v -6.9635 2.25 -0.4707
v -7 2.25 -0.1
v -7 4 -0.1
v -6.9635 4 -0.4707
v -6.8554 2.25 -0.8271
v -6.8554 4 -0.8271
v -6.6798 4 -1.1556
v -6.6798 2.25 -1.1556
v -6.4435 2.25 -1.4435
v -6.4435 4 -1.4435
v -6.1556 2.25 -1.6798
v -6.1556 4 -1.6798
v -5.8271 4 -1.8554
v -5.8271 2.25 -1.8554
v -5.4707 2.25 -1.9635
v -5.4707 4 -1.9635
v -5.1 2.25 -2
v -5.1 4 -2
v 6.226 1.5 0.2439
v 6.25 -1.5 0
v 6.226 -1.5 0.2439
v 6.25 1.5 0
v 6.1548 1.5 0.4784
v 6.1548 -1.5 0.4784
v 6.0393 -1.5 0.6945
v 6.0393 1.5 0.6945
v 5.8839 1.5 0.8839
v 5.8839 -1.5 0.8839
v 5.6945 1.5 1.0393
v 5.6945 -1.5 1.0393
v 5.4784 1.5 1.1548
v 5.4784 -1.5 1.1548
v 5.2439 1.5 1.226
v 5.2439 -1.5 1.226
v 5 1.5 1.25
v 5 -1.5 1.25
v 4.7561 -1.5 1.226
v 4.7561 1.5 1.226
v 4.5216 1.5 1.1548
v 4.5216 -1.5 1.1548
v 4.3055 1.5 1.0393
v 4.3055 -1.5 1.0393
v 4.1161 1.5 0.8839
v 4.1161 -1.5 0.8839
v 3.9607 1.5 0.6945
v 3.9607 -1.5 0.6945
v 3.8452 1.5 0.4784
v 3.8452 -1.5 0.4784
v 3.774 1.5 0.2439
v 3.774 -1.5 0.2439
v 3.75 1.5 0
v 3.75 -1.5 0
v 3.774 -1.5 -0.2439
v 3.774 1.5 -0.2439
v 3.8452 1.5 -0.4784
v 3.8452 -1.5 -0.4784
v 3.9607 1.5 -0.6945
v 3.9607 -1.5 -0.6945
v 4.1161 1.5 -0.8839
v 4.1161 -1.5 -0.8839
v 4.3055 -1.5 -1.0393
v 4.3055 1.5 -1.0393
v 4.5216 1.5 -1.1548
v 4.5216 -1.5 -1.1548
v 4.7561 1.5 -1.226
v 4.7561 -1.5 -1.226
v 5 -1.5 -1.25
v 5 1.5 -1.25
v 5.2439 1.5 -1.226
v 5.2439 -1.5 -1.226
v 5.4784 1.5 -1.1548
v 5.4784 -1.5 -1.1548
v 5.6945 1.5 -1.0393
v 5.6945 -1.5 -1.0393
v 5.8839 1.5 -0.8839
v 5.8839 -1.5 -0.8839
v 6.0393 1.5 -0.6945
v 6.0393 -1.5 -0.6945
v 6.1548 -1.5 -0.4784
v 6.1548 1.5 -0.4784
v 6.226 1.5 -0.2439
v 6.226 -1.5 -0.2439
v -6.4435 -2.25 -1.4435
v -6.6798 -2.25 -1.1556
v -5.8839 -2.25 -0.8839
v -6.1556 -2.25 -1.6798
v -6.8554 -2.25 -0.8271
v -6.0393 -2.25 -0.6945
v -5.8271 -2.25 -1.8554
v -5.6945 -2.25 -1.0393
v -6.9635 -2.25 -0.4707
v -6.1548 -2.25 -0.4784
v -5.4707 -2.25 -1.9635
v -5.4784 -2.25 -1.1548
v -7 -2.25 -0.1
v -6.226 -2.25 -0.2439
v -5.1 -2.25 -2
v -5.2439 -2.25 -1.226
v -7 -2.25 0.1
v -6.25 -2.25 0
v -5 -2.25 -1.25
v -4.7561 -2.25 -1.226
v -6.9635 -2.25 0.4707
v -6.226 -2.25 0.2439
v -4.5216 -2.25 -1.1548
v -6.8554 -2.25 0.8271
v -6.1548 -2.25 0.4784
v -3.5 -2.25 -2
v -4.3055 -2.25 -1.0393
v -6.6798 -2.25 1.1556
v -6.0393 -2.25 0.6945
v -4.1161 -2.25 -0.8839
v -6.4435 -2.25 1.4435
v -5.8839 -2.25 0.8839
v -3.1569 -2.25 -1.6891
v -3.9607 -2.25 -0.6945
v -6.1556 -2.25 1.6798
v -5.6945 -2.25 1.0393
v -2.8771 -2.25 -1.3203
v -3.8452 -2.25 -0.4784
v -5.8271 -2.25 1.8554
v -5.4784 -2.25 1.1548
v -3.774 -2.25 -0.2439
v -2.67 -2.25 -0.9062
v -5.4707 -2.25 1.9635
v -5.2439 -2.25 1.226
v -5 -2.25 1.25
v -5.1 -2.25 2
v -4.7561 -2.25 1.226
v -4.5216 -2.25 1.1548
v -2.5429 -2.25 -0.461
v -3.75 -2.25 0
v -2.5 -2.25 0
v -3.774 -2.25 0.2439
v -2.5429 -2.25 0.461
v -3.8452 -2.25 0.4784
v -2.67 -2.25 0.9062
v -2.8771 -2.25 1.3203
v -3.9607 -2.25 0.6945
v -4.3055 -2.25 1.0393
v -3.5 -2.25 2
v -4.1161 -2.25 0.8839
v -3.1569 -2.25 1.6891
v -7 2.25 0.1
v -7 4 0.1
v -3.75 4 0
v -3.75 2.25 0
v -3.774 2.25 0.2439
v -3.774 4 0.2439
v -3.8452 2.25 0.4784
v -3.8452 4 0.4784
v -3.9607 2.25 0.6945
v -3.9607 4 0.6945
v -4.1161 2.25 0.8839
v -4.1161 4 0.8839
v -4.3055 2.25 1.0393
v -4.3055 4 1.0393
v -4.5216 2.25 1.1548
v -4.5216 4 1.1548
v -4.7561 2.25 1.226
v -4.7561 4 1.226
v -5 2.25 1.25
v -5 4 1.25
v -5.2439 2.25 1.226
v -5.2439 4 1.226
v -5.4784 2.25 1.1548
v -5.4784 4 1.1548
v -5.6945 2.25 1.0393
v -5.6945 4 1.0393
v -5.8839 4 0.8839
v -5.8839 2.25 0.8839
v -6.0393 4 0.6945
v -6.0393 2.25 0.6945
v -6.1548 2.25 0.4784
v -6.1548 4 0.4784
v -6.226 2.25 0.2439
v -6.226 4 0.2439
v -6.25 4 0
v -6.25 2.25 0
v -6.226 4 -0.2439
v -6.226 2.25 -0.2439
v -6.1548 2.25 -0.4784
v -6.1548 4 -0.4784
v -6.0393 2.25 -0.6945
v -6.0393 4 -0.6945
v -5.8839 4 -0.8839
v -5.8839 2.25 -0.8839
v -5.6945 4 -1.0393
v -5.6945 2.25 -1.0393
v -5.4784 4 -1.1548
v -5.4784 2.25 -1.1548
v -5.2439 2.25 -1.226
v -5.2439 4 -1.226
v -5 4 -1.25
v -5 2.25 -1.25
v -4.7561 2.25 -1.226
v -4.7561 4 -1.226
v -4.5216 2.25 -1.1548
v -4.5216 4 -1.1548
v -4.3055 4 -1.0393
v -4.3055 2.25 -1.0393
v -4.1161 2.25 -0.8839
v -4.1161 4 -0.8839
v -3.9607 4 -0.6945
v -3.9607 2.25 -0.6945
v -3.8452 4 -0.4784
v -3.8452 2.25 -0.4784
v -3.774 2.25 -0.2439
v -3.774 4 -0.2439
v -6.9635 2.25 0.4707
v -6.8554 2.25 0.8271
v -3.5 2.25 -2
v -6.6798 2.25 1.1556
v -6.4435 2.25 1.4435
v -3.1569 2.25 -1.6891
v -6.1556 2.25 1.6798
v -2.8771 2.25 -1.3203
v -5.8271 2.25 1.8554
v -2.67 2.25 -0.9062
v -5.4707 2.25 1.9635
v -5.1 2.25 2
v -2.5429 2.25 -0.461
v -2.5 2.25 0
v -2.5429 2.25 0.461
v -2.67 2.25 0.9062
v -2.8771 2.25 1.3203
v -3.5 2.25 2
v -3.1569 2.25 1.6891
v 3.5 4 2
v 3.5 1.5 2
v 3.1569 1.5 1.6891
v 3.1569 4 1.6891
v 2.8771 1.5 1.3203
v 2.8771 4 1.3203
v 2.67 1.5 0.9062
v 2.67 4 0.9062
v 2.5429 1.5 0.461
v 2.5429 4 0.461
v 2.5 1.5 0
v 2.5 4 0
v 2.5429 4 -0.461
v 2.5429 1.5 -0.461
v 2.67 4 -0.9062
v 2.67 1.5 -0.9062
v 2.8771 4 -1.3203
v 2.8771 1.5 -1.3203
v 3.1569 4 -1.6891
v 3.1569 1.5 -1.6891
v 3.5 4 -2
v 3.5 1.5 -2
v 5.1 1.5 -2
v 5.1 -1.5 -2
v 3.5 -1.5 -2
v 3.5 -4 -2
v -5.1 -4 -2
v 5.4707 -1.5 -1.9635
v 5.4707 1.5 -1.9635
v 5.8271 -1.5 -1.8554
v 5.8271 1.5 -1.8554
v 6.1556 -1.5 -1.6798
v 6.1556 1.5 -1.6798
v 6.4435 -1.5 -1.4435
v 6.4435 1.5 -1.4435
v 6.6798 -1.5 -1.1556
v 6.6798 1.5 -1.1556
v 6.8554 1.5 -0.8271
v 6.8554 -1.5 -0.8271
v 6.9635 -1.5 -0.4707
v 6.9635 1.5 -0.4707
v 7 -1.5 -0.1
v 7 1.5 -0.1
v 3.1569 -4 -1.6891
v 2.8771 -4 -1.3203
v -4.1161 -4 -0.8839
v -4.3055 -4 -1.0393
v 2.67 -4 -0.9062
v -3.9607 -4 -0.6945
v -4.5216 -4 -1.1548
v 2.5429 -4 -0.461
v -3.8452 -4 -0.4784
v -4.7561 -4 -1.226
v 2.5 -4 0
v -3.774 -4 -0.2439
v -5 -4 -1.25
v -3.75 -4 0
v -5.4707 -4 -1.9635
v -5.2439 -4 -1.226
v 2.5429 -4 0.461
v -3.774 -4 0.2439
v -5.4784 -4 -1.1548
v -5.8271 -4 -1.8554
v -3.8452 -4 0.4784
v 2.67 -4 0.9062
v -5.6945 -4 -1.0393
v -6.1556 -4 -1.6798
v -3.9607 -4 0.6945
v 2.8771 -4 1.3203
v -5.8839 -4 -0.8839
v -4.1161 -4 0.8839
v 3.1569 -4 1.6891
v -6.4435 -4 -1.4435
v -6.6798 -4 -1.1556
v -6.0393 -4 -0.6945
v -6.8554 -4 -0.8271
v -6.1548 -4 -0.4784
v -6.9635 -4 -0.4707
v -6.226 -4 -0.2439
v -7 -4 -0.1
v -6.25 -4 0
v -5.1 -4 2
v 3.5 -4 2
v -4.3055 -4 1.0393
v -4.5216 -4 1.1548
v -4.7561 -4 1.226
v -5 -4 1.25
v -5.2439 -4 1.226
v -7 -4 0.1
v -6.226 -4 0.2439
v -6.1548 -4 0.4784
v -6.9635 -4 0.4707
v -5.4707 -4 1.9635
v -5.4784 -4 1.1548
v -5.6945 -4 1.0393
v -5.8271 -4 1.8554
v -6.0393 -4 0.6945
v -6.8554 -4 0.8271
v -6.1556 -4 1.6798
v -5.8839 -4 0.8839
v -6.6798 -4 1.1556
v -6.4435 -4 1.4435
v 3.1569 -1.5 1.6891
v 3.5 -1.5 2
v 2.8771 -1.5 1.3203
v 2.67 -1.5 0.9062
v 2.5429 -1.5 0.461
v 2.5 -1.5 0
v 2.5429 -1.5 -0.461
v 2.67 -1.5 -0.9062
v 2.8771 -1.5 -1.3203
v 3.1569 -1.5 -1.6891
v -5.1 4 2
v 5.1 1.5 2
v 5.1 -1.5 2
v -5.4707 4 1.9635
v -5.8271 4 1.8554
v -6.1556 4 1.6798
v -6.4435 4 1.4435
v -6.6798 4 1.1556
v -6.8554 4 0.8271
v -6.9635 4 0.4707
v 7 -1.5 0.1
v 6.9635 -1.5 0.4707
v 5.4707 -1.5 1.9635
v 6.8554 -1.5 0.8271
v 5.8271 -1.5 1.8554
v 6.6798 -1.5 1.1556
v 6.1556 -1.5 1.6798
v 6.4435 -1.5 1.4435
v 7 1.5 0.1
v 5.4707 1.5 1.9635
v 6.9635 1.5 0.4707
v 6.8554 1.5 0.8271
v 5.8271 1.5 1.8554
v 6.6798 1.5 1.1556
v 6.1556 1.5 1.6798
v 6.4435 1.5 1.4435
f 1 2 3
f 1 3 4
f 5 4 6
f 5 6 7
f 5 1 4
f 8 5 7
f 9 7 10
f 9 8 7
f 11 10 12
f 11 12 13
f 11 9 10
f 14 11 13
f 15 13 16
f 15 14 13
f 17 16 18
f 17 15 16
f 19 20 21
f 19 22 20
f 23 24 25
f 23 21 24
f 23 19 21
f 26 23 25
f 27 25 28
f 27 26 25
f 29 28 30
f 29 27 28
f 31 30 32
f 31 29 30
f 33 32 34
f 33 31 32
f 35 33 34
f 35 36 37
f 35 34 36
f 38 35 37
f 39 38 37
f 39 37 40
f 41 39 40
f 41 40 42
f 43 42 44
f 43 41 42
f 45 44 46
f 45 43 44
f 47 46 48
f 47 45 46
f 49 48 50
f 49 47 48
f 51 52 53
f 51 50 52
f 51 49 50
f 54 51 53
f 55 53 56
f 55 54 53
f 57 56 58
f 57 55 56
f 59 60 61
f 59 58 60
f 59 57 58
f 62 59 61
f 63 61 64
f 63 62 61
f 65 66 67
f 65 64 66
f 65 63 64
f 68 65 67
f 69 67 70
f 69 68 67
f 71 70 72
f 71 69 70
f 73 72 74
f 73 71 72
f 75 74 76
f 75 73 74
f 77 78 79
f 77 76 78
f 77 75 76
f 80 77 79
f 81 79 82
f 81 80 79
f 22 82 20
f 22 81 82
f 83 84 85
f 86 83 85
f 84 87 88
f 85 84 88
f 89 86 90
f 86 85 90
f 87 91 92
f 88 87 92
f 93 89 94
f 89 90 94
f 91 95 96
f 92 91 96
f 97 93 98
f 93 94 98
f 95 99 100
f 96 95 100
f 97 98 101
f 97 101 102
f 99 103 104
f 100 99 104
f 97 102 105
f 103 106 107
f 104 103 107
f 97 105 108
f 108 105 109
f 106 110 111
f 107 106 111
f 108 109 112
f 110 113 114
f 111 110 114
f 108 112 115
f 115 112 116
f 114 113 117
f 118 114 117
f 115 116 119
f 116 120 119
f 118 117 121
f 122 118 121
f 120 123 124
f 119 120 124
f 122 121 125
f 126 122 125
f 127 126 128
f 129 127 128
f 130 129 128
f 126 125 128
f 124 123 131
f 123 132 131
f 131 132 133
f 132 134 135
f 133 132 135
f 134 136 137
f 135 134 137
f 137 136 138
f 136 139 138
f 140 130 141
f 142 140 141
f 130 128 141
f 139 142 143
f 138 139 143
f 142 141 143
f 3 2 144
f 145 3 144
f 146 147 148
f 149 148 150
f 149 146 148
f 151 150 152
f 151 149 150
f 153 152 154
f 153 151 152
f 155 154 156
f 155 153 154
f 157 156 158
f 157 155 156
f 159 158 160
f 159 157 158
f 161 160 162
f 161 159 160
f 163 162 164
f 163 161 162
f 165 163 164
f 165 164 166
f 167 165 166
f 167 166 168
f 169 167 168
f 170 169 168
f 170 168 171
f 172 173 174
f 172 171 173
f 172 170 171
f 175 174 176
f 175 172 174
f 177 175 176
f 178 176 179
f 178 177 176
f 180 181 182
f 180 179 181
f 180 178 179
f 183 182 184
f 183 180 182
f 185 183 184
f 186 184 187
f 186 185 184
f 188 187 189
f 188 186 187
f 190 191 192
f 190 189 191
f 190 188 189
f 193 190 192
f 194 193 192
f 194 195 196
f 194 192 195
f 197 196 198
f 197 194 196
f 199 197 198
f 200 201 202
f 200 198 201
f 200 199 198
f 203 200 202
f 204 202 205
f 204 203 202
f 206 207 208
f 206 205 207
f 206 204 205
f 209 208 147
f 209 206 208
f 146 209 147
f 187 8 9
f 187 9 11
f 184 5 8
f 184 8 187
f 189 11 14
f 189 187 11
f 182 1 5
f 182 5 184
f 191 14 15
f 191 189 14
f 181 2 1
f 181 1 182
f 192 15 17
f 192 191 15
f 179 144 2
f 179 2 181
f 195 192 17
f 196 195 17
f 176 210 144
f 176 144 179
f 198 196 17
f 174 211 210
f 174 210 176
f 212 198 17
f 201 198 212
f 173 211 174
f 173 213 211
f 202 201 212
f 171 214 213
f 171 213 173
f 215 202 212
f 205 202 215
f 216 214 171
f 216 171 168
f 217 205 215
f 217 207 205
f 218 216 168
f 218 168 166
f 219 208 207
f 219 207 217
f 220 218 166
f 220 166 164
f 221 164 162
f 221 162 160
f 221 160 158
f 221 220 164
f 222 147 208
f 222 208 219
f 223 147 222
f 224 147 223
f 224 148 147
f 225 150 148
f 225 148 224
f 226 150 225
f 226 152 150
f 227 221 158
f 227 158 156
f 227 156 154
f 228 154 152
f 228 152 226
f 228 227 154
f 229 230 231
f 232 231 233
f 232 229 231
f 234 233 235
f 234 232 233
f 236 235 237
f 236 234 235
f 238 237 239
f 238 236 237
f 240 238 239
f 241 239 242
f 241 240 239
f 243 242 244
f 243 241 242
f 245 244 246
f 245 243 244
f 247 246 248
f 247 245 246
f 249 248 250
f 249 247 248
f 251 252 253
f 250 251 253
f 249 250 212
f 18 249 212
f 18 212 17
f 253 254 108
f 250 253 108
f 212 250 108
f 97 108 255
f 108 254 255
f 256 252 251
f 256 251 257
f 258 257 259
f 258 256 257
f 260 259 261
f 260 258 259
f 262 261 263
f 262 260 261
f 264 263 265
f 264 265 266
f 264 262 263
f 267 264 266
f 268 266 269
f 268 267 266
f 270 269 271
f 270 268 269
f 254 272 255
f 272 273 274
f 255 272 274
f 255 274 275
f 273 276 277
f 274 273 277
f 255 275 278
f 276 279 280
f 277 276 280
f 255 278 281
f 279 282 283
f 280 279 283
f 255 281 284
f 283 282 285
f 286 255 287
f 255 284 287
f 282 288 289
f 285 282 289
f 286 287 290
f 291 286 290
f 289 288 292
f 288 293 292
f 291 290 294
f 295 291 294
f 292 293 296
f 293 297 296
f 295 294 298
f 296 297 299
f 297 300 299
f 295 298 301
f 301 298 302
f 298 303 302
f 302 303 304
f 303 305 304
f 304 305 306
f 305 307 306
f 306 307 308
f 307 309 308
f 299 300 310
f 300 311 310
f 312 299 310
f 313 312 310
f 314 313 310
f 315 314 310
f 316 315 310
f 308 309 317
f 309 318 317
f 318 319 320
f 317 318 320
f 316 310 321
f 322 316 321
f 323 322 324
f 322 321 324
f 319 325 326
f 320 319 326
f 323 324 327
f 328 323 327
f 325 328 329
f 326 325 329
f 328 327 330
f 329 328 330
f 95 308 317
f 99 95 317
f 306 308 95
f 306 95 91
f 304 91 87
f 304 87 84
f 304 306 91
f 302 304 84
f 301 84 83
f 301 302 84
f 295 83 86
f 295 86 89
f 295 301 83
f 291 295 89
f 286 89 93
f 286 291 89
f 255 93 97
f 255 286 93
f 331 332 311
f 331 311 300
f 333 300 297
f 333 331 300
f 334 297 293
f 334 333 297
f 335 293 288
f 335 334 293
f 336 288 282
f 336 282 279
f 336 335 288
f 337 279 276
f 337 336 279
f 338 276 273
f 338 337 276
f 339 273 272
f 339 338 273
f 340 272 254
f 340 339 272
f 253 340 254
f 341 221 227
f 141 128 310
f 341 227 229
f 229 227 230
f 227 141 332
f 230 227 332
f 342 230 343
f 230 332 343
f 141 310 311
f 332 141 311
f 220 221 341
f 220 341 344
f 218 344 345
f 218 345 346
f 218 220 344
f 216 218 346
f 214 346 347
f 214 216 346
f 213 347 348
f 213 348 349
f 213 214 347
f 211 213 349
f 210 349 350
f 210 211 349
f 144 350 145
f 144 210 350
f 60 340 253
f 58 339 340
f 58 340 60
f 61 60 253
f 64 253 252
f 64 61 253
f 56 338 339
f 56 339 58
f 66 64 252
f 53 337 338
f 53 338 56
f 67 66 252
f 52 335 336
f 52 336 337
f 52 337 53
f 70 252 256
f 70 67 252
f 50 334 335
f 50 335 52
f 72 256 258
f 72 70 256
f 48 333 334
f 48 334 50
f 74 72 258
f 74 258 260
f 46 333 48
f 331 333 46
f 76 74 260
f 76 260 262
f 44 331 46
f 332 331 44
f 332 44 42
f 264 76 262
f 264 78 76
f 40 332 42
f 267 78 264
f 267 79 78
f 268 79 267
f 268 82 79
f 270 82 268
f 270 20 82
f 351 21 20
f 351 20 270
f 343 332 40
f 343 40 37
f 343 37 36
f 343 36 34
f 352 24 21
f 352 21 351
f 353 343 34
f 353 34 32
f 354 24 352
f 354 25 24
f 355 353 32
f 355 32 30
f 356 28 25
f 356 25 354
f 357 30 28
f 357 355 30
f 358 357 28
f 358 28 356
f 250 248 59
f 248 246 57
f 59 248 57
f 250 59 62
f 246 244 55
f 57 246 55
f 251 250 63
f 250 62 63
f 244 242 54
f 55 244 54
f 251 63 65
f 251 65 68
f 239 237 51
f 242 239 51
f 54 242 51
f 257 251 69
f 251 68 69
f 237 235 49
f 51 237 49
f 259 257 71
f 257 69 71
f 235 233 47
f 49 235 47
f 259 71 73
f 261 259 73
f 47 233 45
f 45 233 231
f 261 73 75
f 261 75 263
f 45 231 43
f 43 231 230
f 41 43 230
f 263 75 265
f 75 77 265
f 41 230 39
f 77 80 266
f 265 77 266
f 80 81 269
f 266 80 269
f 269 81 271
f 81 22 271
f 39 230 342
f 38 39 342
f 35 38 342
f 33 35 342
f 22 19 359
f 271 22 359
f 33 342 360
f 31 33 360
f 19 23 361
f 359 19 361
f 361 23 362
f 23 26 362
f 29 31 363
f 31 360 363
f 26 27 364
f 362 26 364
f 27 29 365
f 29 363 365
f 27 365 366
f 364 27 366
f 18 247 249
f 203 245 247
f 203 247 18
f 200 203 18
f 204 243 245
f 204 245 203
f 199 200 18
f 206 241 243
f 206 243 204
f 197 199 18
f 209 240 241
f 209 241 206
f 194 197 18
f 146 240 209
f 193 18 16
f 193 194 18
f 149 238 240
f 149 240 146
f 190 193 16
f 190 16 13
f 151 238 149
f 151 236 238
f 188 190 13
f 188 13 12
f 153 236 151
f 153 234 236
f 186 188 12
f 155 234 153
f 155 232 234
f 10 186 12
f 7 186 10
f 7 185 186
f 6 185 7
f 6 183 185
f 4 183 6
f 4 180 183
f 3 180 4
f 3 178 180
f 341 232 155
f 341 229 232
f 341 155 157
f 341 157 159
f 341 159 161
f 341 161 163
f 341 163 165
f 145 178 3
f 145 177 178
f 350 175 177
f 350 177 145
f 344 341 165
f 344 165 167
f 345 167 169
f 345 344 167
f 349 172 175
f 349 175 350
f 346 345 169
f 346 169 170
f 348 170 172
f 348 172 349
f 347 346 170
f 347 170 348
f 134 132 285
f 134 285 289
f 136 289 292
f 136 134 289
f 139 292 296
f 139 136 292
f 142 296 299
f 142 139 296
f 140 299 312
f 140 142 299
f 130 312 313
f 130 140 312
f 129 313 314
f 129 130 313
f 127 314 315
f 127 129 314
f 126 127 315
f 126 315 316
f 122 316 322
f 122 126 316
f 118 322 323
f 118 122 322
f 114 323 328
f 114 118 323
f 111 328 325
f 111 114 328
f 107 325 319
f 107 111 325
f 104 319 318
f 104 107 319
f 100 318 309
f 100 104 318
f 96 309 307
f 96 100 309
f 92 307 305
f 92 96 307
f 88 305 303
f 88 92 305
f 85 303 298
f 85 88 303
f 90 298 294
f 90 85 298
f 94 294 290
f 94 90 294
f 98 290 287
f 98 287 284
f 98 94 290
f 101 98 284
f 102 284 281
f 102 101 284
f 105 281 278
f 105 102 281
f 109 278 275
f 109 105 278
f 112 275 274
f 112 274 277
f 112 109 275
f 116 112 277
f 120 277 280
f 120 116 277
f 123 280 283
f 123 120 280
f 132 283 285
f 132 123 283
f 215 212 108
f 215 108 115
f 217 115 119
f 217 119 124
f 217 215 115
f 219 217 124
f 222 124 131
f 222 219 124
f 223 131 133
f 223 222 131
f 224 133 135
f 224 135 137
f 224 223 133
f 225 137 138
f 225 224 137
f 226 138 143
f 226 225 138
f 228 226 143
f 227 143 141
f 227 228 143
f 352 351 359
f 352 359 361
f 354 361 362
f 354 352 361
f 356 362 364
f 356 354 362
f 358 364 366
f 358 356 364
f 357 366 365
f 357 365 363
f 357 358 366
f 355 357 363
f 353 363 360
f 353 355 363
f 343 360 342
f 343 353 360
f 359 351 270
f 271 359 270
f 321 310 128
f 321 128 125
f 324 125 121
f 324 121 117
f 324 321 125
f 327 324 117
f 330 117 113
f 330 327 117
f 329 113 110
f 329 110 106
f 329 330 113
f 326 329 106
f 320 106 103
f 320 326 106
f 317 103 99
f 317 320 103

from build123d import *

# Parameters (mm, degrees)
CYLINDER001_R          = 2.5
CYLINDER001_DEPTH      = 2.5
CYLINDER001_ROLL_ANGLE = 90
CYLINDER002_R          = 2.5
CYLINDER002_DEPTH      = 2.5
CYLINDER002_ROLL_ANGLE = 90
CYLINDER_R             = 2.5
CYLINDER_DEPTH         = 4.5
CYLINDER_ROLL_ANGLE    = 90
SKETCH_R               = 1.25
PAD_DEPTH              = 4


with BuildPart() as cylinder001:
    # Cylinder001 → Cylinder001 (new body)
    with BuildSketch(Plane.XY):
        Circle(CYLINDER001_R)
    extrude(amount=CYLINDER001_DEPTH)


with BuildPart() as cylinder001_1:
    # Cylinder001 roll: moved
    add(cylinder001.part.rotate(Axis((0, 0, 0), (1, 0, 0)), CYLINDER001_ROLL_ANGLE))


with BuildPart() as cylinder001_2:
    # Cylinder001 placement: moved
    add(cylinder001_1.part.moved(Location((5, 4, 0))))


with BuildPart() as cylinder002:
    # Cylinder002 → Cylinder002 (new body)
    with BuildSketch(Plane.XY):
        Circle(CYLINDER002_R)
    extrude(amount=CYLINDER002_DEPTH)


with BuildPart() as cylinder002_1:
    # Cylinder002 roll: moved
    add(cylinder002.part.rotate(Axis((0, 0, 0), (1, 0, 0)), CYLINDER002_ROLL_ANGLE))


with BuildPart() as cylinder002_2:
    # Cylinder002 placement: moved
    add(cylinder002_1.part.moved(Location((5, -1.5, 0))))


with BuildPart() as axes_cutout:
    # Cylinder → Cylinder (new body)
    with BuildSketch(Plane.XY):
        Circle(CYLINDER_R)
    extrude(amount=CYLINDER_DEPTH)


with BuildPart() as axes_cutout_1:
    # Cylinder roll: moved
    add(axes_cutout.part.rotate(Axis((0, 0, 0), (1, 0, 0)), CYLINDER_ROLL_ANGLE))


with BuildPart() as axes_cutout_2:
    # Cylinder placement: moved
    add(axes_cutout_1.part.moved(Location((-5, 2.25, 0))))

    # Fusion: union Cylinder001, Cylinder002
    add(cylinder001_2.part)
    add(cylinder002_2.part)


with BuildPart() as track_shape:
    # Sketch → Pad (new body, symmetric)
    with BuildSketch(Plane.XZ):
        with BuildLine():
            Line((-5.1, 2), (5.1, 2))
            ThreePointArc((7, 0.1), (6.443503, 1.443503), (5.1, 2))
            Line((7, 0.1), (7, -0.1))
            ThreePointArc((5.1, -2), (6.443503, -1.443503), (7, -0.1))
            Line((5.1, -2), (-5.1, -2))
            ThreePointArc((-7, -0.1), (-6.443503, -1.443503), (-5.1, -2))
            Line((-7, -0.1), (-7, 0.1))
            ThreePointArc((-5.1, 2), (-6.443503, 1.443503), (-7, 0.1))
        make_face()
        with Locations((-5, 0)):
            Circle(SKETCH_R, mode=Mode.SUBTRACT)
        with Locations((5, 0)):
            Circle(SKETCH_R, mode=Mode.SUBTRACT)
    extrude(amount=PAD_DEPTH, both=True)

    # Cut: cut axes-cutout
    add(axes_cutout_2.part, mode=Mode.SUBTRACT)


solid = track_shape.part
